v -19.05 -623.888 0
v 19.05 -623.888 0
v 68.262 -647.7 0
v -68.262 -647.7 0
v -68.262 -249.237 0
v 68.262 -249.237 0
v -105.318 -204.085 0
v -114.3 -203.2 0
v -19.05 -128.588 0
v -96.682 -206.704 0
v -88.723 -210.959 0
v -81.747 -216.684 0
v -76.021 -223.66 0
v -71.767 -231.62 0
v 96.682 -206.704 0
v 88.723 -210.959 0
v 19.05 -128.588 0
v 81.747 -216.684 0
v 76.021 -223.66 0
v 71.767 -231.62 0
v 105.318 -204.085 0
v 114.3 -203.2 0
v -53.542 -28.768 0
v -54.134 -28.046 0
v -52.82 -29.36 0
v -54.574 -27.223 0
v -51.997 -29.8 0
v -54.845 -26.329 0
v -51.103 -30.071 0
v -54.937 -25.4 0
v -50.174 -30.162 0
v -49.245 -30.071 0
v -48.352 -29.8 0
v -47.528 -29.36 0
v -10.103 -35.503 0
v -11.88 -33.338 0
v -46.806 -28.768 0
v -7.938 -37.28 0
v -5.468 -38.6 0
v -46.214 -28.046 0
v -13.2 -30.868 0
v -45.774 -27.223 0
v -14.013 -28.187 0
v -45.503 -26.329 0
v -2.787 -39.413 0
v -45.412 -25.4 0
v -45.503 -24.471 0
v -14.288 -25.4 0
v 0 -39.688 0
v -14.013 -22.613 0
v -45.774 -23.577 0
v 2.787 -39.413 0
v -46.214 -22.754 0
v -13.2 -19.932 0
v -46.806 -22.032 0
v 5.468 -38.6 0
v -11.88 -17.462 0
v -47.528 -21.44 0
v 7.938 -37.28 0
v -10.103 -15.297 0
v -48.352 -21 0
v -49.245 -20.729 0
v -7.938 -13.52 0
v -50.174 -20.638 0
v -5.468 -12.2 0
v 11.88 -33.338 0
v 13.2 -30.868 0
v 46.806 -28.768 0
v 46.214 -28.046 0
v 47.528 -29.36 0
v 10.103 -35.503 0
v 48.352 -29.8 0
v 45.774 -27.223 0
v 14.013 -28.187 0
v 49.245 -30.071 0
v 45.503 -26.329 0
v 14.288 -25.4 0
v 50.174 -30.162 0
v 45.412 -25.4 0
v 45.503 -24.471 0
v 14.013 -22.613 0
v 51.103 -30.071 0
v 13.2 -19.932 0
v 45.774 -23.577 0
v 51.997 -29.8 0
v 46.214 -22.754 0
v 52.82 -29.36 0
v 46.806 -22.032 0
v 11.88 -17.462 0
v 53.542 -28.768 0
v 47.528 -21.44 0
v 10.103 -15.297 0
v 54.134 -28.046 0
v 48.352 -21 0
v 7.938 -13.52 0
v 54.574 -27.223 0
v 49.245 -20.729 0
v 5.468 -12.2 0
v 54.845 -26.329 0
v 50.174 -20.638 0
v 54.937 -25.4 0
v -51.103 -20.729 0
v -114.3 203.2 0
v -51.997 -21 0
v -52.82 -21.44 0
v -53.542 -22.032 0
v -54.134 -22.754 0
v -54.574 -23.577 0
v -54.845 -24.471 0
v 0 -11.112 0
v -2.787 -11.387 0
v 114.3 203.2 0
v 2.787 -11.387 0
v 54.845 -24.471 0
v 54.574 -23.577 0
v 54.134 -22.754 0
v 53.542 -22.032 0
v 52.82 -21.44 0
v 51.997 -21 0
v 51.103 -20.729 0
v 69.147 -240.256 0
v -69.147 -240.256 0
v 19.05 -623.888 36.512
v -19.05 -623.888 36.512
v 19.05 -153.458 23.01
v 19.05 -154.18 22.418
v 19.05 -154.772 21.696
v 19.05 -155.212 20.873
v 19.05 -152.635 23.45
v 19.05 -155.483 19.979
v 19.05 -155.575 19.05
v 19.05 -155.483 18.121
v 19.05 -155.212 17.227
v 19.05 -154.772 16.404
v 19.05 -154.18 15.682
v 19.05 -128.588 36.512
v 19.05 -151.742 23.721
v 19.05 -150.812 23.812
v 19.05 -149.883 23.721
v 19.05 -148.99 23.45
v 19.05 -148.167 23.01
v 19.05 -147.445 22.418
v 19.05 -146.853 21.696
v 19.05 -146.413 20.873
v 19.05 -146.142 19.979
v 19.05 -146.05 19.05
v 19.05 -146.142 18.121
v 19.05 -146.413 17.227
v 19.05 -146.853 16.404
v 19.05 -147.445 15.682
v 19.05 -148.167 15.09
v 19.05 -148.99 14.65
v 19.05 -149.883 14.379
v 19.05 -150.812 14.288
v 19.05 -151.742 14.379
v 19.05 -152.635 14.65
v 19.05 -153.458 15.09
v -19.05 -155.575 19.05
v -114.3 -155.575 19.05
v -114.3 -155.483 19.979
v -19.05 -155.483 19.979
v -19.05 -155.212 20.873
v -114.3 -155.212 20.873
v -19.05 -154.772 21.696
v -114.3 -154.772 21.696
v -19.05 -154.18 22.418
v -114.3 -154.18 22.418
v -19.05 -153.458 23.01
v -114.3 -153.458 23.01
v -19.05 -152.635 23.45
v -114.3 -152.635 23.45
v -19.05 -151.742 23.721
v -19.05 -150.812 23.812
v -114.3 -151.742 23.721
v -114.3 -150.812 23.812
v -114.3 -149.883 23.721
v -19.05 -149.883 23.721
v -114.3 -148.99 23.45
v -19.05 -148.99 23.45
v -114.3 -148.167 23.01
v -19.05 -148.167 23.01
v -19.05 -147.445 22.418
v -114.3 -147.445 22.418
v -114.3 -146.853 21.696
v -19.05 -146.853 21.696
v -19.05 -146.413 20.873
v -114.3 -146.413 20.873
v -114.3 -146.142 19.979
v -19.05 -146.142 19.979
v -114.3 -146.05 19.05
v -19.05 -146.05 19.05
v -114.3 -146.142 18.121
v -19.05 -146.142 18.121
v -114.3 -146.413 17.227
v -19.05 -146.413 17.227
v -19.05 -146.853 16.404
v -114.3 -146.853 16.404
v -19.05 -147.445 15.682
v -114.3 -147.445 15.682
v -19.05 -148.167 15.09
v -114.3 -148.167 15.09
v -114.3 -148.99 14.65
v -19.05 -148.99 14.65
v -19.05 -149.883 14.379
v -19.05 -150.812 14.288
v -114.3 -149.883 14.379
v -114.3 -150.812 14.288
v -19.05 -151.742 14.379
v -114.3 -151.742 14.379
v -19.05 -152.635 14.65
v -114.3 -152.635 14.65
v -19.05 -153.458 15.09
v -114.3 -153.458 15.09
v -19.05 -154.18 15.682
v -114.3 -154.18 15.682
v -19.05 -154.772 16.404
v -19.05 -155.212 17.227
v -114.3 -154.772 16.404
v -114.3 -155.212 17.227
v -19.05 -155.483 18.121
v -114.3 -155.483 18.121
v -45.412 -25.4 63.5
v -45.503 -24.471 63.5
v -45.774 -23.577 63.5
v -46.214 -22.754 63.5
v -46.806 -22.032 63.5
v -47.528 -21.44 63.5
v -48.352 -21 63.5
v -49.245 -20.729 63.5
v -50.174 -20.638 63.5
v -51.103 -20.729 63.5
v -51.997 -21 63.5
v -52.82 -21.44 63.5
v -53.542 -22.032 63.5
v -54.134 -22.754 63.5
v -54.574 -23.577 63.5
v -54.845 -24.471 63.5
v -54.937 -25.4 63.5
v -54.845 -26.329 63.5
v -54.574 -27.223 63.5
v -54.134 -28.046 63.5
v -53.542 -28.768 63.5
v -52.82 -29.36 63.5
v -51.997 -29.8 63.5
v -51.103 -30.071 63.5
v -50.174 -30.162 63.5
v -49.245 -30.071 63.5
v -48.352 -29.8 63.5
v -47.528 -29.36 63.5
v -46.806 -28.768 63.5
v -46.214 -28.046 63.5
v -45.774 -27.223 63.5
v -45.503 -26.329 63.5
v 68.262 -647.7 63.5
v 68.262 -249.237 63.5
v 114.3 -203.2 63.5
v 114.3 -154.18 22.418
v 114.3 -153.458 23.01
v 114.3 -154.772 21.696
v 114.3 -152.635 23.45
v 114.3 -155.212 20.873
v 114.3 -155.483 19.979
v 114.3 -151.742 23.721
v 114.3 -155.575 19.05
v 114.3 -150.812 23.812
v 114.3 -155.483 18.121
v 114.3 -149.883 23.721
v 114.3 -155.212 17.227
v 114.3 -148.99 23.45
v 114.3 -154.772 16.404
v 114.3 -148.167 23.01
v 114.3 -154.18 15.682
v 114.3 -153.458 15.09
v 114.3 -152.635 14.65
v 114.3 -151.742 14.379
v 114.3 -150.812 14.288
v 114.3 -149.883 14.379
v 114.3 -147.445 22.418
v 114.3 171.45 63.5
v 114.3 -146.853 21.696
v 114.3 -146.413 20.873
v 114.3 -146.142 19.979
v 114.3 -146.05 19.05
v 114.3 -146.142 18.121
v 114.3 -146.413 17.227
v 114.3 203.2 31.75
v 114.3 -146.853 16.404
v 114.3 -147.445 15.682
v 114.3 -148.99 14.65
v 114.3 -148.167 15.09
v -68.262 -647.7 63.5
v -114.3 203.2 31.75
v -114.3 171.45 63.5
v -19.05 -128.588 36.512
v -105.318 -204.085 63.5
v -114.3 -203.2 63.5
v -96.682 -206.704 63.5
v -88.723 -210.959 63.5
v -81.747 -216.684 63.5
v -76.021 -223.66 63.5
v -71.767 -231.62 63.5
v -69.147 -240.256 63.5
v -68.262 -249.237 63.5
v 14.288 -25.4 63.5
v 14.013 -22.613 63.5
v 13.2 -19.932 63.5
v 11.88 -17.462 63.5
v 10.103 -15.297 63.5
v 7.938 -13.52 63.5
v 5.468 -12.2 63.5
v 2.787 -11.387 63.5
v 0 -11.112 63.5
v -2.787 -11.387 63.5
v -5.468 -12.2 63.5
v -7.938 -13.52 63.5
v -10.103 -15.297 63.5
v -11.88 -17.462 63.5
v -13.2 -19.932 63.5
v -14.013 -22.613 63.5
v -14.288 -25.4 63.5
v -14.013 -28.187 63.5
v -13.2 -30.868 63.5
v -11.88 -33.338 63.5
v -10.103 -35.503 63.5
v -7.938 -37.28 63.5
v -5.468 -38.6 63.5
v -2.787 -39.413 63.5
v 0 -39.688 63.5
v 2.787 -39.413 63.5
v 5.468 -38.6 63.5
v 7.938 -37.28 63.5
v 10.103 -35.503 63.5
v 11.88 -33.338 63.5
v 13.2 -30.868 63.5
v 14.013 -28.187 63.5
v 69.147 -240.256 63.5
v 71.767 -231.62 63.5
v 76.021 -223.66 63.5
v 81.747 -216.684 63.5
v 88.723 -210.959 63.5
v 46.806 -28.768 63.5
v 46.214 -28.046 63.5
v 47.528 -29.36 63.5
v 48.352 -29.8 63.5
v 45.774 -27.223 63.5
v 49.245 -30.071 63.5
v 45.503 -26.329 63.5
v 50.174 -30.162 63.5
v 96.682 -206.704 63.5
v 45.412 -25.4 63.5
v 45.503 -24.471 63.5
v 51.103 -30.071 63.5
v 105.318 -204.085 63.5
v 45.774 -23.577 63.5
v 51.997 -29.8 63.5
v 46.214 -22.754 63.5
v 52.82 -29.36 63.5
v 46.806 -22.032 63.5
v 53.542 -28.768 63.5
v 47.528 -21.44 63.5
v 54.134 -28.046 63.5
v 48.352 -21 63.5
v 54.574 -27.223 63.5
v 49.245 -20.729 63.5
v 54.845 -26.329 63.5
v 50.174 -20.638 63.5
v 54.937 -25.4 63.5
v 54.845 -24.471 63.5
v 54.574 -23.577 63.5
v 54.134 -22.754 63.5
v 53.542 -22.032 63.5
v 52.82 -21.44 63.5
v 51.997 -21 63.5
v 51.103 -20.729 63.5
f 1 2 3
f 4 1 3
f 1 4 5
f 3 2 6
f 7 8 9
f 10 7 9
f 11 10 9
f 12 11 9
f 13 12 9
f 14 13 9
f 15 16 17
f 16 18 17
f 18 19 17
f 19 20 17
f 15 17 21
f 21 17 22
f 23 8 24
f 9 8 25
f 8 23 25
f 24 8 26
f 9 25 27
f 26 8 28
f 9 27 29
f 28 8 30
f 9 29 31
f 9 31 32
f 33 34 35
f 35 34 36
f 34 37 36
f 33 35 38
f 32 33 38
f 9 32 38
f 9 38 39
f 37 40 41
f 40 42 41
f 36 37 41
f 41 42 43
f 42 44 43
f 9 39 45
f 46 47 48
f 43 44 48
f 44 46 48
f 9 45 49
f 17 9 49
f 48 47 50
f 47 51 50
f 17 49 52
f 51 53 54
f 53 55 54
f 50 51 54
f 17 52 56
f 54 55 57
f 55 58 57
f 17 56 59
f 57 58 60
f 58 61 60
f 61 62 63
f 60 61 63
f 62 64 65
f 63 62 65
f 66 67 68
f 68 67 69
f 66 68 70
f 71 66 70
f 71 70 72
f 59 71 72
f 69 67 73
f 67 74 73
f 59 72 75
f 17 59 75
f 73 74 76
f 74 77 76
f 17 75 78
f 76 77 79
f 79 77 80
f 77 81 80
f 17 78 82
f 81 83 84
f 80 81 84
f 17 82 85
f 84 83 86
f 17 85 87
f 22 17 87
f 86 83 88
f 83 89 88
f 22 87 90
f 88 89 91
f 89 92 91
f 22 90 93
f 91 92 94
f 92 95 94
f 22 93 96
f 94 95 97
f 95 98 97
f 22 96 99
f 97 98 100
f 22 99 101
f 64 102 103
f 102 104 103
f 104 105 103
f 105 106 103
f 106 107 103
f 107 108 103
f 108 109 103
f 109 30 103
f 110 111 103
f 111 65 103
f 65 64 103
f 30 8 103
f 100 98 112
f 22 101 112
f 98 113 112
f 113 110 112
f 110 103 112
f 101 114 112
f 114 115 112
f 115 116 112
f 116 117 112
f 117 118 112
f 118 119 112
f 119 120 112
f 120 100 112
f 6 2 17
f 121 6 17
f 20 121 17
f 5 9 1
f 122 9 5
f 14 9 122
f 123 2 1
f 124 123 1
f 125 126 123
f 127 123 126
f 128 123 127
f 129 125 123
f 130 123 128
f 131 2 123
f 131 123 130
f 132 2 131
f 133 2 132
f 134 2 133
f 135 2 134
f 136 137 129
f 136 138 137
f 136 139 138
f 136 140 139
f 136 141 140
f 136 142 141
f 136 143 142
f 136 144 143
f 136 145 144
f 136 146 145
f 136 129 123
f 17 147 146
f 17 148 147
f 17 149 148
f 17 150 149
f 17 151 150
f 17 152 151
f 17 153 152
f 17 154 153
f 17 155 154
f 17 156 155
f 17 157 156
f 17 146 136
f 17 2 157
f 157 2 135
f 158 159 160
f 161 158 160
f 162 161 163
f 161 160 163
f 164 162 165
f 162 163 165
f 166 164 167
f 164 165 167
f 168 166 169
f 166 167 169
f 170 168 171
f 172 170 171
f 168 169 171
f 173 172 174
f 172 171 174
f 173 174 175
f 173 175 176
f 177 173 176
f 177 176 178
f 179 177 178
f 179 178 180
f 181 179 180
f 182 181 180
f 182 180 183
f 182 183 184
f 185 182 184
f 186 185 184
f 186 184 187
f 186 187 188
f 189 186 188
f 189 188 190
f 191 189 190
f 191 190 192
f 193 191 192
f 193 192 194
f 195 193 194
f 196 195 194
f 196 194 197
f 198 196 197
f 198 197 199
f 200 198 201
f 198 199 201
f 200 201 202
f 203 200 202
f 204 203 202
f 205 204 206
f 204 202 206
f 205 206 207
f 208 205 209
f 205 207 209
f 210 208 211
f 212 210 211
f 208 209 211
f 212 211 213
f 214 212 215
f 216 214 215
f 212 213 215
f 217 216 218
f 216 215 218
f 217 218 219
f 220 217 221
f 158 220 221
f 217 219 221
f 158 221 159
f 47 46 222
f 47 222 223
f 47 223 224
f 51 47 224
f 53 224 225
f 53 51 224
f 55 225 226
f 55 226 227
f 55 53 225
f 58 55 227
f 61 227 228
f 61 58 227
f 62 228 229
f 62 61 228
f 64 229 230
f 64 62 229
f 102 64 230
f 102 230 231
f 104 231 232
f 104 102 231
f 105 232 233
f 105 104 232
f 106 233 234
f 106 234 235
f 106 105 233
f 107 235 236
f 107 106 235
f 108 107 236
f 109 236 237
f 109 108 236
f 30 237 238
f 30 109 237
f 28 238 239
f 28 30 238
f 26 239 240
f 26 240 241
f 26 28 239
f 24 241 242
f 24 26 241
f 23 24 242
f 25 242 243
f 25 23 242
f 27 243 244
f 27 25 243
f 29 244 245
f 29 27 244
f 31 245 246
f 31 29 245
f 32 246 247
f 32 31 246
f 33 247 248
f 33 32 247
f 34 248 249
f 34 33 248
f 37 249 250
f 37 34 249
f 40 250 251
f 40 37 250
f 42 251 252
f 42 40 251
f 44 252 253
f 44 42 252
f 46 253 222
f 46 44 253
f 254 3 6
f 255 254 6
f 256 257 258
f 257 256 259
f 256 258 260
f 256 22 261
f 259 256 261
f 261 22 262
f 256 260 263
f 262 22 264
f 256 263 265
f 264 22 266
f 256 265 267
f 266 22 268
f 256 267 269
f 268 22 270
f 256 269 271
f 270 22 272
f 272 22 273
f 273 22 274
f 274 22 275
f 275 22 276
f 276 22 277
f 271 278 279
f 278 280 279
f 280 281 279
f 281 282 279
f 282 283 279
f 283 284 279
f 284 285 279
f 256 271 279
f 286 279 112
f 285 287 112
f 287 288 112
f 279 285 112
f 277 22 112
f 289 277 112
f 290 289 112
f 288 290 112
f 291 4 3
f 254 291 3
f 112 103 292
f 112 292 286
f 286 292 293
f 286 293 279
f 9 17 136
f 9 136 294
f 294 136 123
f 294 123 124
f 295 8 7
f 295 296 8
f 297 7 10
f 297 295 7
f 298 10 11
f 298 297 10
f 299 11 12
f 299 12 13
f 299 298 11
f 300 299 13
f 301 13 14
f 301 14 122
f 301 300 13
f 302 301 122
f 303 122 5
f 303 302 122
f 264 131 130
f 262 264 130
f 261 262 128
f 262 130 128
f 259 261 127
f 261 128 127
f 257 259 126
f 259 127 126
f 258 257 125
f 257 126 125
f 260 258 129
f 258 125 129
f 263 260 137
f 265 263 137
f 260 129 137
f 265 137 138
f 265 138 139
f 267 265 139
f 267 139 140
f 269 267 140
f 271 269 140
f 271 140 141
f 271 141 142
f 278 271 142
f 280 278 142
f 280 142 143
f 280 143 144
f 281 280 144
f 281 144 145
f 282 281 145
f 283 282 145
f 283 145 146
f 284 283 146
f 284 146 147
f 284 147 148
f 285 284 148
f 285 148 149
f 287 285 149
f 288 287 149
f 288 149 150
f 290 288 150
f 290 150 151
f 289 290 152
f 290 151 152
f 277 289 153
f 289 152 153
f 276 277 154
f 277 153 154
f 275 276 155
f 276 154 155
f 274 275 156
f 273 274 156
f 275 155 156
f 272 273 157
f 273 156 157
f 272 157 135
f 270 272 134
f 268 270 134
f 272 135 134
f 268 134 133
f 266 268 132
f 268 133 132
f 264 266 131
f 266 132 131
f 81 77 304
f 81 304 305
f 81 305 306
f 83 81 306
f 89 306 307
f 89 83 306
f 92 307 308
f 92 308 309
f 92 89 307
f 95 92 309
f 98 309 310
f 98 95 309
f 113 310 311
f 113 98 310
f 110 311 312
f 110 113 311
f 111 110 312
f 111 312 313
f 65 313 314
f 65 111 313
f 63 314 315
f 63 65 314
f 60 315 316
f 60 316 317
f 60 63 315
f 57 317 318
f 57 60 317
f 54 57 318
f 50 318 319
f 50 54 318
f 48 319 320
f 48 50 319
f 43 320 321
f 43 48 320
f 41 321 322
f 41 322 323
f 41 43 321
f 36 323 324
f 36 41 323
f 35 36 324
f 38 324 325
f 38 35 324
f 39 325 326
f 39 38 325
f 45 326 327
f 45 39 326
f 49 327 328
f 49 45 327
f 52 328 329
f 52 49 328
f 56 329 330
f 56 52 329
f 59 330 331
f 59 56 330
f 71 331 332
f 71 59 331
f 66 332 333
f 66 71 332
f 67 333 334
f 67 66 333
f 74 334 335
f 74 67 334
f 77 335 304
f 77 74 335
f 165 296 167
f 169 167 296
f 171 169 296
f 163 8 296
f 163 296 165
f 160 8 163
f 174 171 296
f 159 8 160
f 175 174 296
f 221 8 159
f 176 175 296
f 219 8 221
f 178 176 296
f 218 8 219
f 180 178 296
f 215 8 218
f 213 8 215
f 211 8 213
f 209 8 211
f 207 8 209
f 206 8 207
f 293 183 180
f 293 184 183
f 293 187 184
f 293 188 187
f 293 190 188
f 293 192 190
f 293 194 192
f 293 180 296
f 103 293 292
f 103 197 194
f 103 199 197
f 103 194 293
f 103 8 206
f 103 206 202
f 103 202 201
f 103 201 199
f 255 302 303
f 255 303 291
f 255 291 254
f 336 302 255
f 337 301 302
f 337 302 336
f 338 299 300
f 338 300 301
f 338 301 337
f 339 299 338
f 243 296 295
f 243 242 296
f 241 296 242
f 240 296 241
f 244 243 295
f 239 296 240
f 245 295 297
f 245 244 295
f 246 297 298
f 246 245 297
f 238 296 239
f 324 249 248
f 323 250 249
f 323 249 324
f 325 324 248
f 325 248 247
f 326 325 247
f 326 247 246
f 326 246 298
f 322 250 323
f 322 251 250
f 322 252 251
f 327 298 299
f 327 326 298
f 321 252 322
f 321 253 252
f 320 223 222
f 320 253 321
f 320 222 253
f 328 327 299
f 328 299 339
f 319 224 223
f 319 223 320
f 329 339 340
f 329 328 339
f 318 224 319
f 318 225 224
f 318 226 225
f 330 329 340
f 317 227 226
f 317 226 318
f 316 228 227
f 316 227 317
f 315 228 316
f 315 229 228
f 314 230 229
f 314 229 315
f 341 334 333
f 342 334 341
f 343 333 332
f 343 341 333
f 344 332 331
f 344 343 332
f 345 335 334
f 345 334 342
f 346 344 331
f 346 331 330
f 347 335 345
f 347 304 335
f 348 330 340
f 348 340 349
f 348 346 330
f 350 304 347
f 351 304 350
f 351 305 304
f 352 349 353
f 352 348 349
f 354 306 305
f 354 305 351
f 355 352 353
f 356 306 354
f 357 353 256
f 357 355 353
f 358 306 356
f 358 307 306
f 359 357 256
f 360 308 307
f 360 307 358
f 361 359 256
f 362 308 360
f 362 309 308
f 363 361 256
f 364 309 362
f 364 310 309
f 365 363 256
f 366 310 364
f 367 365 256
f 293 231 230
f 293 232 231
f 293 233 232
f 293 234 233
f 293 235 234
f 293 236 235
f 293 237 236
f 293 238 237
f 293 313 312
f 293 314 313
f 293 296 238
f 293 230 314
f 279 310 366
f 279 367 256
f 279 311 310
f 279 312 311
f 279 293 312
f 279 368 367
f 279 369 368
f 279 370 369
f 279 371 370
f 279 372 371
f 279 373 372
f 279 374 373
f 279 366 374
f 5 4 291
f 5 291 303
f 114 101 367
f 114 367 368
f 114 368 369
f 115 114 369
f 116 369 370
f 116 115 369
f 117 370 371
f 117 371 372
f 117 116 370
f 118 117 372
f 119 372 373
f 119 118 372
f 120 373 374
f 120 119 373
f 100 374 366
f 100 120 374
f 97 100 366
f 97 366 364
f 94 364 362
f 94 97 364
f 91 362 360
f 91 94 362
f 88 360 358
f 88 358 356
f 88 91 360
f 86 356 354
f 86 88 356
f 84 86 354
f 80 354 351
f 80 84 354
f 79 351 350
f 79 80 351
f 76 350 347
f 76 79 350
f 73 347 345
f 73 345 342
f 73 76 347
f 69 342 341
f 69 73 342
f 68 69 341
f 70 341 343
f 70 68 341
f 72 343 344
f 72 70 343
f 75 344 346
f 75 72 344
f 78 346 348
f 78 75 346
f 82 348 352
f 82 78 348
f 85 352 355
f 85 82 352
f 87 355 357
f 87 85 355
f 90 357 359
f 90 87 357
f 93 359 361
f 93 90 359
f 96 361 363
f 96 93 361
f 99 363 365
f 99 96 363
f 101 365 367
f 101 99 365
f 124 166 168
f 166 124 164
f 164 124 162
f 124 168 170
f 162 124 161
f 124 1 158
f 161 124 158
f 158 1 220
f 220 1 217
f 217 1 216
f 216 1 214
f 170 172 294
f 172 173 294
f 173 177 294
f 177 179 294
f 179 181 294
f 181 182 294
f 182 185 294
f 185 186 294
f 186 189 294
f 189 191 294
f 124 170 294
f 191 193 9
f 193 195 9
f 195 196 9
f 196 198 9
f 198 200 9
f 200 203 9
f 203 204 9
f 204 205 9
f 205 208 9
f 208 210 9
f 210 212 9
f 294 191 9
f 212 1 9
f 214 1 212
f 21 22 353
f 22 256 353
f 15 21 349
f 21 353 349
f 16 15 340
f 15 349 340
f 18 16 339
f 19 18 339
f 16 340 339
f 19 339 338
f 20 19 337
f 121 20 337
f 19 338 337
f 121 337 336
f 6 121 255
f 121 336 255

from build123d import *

# Parameters (mm, degrees)
SKETCH1_W           = 228.6
SKETCH1_H           = 406.4
SKETCH1_R           = 14.2875
SKETCH1_R_2         = 4.7625
SKETCH1_W_2         = 136.525
SKETCH1_H_2         = 444.5
BOSS_EXTRUDE1_DEPTH = 63.5
SKETCH2_W           = 38.1
SKETCH2_H           = 495.3
CUT_EXTRUDE1_DEPTH  = 36.5125
SKETCH3_R           = 4.7625
CUT_EXTRUDE2_DEPTH  = 690.786561191
FILLET1_R           = 46.0375
CHAMFER1_SIZE       = 31.75


with BuildPart() as part:
    # Sketch1 → Boss-Extrude1 (new body)
    # profile 1 of 2: a face of its own
    with BuildSketch(Plane.XY):
        Rectangle(SKETCH1_W, SKETCH1_H)
        with Locations((0, -25.4)):
            Circle(SKETCH1_R, mode=Mode.SUBTRACT)
        with Locations((-50.174093823, -25.4)):
            Circle(SKETCH1_R_2, mode=Mode.SUBTRACT)
        with Locations((50.174093823, -25.4)):
            Circle(SKETCH1_R_2, mode=Mode.SUBTRACT)
    # profile 2 of 2: a face of its own
    with BuildSketch(Plane.XY):
        with Locations((0, -425.45)):
            Rectangle(SKETCH1_W_2, SKETCH1_H_2)
    extrude(amount=BOSS_EXTRUDE1_DEPTH)

    # Sketch2 → Cut-Extrude1 (cut)
    with BuildSketch(Plane(origin=(0, 0, 0), x_dir=(-1, 0, 0), z_dir=(0, 0, -1))):
        with Locations((0, -376.2375)):
            Rectangle(SKETCH2_W, SKETCH2_H)
    extrude(amount=-CUT_EXTRUDE1_DEPTH, mode=Mode.SUBTRACT)

    # Sketch3 → Cut-Extrude2 (cut, through all)
    with BuildSketch(Plane.ZY.offset(114.3)):
        with Locations(Location((19.05, -150.8125, 0), (0, 0, 270))):
            Circle(SKETCH3_R)
    extrude(amount=-CUT_EXTRUDE2_DEPTH, mode=Mode.SUBTRACT)

    # Fillet1
    fillet1_edges = [part.edges().sort_by_distance(p)[0] for p in [
        (68.2625, -203.2, 31.75),
        (-68.2625, -203.2, 31.75),
    ]]
    fillet(fillet1_edges, radius=FILLET1_R - 0.0001)  # a hair under: the kernel refuses the full size

    # Chamfer1
    chamfer1_edges = [part.edges().sort_by_distance(p)[0] for p in [
        (0, 203.2, 63.5),
    ]]
    chamfer(chamfer1_edges, length=CHAMFER1_SIZE)


solid = part.part
